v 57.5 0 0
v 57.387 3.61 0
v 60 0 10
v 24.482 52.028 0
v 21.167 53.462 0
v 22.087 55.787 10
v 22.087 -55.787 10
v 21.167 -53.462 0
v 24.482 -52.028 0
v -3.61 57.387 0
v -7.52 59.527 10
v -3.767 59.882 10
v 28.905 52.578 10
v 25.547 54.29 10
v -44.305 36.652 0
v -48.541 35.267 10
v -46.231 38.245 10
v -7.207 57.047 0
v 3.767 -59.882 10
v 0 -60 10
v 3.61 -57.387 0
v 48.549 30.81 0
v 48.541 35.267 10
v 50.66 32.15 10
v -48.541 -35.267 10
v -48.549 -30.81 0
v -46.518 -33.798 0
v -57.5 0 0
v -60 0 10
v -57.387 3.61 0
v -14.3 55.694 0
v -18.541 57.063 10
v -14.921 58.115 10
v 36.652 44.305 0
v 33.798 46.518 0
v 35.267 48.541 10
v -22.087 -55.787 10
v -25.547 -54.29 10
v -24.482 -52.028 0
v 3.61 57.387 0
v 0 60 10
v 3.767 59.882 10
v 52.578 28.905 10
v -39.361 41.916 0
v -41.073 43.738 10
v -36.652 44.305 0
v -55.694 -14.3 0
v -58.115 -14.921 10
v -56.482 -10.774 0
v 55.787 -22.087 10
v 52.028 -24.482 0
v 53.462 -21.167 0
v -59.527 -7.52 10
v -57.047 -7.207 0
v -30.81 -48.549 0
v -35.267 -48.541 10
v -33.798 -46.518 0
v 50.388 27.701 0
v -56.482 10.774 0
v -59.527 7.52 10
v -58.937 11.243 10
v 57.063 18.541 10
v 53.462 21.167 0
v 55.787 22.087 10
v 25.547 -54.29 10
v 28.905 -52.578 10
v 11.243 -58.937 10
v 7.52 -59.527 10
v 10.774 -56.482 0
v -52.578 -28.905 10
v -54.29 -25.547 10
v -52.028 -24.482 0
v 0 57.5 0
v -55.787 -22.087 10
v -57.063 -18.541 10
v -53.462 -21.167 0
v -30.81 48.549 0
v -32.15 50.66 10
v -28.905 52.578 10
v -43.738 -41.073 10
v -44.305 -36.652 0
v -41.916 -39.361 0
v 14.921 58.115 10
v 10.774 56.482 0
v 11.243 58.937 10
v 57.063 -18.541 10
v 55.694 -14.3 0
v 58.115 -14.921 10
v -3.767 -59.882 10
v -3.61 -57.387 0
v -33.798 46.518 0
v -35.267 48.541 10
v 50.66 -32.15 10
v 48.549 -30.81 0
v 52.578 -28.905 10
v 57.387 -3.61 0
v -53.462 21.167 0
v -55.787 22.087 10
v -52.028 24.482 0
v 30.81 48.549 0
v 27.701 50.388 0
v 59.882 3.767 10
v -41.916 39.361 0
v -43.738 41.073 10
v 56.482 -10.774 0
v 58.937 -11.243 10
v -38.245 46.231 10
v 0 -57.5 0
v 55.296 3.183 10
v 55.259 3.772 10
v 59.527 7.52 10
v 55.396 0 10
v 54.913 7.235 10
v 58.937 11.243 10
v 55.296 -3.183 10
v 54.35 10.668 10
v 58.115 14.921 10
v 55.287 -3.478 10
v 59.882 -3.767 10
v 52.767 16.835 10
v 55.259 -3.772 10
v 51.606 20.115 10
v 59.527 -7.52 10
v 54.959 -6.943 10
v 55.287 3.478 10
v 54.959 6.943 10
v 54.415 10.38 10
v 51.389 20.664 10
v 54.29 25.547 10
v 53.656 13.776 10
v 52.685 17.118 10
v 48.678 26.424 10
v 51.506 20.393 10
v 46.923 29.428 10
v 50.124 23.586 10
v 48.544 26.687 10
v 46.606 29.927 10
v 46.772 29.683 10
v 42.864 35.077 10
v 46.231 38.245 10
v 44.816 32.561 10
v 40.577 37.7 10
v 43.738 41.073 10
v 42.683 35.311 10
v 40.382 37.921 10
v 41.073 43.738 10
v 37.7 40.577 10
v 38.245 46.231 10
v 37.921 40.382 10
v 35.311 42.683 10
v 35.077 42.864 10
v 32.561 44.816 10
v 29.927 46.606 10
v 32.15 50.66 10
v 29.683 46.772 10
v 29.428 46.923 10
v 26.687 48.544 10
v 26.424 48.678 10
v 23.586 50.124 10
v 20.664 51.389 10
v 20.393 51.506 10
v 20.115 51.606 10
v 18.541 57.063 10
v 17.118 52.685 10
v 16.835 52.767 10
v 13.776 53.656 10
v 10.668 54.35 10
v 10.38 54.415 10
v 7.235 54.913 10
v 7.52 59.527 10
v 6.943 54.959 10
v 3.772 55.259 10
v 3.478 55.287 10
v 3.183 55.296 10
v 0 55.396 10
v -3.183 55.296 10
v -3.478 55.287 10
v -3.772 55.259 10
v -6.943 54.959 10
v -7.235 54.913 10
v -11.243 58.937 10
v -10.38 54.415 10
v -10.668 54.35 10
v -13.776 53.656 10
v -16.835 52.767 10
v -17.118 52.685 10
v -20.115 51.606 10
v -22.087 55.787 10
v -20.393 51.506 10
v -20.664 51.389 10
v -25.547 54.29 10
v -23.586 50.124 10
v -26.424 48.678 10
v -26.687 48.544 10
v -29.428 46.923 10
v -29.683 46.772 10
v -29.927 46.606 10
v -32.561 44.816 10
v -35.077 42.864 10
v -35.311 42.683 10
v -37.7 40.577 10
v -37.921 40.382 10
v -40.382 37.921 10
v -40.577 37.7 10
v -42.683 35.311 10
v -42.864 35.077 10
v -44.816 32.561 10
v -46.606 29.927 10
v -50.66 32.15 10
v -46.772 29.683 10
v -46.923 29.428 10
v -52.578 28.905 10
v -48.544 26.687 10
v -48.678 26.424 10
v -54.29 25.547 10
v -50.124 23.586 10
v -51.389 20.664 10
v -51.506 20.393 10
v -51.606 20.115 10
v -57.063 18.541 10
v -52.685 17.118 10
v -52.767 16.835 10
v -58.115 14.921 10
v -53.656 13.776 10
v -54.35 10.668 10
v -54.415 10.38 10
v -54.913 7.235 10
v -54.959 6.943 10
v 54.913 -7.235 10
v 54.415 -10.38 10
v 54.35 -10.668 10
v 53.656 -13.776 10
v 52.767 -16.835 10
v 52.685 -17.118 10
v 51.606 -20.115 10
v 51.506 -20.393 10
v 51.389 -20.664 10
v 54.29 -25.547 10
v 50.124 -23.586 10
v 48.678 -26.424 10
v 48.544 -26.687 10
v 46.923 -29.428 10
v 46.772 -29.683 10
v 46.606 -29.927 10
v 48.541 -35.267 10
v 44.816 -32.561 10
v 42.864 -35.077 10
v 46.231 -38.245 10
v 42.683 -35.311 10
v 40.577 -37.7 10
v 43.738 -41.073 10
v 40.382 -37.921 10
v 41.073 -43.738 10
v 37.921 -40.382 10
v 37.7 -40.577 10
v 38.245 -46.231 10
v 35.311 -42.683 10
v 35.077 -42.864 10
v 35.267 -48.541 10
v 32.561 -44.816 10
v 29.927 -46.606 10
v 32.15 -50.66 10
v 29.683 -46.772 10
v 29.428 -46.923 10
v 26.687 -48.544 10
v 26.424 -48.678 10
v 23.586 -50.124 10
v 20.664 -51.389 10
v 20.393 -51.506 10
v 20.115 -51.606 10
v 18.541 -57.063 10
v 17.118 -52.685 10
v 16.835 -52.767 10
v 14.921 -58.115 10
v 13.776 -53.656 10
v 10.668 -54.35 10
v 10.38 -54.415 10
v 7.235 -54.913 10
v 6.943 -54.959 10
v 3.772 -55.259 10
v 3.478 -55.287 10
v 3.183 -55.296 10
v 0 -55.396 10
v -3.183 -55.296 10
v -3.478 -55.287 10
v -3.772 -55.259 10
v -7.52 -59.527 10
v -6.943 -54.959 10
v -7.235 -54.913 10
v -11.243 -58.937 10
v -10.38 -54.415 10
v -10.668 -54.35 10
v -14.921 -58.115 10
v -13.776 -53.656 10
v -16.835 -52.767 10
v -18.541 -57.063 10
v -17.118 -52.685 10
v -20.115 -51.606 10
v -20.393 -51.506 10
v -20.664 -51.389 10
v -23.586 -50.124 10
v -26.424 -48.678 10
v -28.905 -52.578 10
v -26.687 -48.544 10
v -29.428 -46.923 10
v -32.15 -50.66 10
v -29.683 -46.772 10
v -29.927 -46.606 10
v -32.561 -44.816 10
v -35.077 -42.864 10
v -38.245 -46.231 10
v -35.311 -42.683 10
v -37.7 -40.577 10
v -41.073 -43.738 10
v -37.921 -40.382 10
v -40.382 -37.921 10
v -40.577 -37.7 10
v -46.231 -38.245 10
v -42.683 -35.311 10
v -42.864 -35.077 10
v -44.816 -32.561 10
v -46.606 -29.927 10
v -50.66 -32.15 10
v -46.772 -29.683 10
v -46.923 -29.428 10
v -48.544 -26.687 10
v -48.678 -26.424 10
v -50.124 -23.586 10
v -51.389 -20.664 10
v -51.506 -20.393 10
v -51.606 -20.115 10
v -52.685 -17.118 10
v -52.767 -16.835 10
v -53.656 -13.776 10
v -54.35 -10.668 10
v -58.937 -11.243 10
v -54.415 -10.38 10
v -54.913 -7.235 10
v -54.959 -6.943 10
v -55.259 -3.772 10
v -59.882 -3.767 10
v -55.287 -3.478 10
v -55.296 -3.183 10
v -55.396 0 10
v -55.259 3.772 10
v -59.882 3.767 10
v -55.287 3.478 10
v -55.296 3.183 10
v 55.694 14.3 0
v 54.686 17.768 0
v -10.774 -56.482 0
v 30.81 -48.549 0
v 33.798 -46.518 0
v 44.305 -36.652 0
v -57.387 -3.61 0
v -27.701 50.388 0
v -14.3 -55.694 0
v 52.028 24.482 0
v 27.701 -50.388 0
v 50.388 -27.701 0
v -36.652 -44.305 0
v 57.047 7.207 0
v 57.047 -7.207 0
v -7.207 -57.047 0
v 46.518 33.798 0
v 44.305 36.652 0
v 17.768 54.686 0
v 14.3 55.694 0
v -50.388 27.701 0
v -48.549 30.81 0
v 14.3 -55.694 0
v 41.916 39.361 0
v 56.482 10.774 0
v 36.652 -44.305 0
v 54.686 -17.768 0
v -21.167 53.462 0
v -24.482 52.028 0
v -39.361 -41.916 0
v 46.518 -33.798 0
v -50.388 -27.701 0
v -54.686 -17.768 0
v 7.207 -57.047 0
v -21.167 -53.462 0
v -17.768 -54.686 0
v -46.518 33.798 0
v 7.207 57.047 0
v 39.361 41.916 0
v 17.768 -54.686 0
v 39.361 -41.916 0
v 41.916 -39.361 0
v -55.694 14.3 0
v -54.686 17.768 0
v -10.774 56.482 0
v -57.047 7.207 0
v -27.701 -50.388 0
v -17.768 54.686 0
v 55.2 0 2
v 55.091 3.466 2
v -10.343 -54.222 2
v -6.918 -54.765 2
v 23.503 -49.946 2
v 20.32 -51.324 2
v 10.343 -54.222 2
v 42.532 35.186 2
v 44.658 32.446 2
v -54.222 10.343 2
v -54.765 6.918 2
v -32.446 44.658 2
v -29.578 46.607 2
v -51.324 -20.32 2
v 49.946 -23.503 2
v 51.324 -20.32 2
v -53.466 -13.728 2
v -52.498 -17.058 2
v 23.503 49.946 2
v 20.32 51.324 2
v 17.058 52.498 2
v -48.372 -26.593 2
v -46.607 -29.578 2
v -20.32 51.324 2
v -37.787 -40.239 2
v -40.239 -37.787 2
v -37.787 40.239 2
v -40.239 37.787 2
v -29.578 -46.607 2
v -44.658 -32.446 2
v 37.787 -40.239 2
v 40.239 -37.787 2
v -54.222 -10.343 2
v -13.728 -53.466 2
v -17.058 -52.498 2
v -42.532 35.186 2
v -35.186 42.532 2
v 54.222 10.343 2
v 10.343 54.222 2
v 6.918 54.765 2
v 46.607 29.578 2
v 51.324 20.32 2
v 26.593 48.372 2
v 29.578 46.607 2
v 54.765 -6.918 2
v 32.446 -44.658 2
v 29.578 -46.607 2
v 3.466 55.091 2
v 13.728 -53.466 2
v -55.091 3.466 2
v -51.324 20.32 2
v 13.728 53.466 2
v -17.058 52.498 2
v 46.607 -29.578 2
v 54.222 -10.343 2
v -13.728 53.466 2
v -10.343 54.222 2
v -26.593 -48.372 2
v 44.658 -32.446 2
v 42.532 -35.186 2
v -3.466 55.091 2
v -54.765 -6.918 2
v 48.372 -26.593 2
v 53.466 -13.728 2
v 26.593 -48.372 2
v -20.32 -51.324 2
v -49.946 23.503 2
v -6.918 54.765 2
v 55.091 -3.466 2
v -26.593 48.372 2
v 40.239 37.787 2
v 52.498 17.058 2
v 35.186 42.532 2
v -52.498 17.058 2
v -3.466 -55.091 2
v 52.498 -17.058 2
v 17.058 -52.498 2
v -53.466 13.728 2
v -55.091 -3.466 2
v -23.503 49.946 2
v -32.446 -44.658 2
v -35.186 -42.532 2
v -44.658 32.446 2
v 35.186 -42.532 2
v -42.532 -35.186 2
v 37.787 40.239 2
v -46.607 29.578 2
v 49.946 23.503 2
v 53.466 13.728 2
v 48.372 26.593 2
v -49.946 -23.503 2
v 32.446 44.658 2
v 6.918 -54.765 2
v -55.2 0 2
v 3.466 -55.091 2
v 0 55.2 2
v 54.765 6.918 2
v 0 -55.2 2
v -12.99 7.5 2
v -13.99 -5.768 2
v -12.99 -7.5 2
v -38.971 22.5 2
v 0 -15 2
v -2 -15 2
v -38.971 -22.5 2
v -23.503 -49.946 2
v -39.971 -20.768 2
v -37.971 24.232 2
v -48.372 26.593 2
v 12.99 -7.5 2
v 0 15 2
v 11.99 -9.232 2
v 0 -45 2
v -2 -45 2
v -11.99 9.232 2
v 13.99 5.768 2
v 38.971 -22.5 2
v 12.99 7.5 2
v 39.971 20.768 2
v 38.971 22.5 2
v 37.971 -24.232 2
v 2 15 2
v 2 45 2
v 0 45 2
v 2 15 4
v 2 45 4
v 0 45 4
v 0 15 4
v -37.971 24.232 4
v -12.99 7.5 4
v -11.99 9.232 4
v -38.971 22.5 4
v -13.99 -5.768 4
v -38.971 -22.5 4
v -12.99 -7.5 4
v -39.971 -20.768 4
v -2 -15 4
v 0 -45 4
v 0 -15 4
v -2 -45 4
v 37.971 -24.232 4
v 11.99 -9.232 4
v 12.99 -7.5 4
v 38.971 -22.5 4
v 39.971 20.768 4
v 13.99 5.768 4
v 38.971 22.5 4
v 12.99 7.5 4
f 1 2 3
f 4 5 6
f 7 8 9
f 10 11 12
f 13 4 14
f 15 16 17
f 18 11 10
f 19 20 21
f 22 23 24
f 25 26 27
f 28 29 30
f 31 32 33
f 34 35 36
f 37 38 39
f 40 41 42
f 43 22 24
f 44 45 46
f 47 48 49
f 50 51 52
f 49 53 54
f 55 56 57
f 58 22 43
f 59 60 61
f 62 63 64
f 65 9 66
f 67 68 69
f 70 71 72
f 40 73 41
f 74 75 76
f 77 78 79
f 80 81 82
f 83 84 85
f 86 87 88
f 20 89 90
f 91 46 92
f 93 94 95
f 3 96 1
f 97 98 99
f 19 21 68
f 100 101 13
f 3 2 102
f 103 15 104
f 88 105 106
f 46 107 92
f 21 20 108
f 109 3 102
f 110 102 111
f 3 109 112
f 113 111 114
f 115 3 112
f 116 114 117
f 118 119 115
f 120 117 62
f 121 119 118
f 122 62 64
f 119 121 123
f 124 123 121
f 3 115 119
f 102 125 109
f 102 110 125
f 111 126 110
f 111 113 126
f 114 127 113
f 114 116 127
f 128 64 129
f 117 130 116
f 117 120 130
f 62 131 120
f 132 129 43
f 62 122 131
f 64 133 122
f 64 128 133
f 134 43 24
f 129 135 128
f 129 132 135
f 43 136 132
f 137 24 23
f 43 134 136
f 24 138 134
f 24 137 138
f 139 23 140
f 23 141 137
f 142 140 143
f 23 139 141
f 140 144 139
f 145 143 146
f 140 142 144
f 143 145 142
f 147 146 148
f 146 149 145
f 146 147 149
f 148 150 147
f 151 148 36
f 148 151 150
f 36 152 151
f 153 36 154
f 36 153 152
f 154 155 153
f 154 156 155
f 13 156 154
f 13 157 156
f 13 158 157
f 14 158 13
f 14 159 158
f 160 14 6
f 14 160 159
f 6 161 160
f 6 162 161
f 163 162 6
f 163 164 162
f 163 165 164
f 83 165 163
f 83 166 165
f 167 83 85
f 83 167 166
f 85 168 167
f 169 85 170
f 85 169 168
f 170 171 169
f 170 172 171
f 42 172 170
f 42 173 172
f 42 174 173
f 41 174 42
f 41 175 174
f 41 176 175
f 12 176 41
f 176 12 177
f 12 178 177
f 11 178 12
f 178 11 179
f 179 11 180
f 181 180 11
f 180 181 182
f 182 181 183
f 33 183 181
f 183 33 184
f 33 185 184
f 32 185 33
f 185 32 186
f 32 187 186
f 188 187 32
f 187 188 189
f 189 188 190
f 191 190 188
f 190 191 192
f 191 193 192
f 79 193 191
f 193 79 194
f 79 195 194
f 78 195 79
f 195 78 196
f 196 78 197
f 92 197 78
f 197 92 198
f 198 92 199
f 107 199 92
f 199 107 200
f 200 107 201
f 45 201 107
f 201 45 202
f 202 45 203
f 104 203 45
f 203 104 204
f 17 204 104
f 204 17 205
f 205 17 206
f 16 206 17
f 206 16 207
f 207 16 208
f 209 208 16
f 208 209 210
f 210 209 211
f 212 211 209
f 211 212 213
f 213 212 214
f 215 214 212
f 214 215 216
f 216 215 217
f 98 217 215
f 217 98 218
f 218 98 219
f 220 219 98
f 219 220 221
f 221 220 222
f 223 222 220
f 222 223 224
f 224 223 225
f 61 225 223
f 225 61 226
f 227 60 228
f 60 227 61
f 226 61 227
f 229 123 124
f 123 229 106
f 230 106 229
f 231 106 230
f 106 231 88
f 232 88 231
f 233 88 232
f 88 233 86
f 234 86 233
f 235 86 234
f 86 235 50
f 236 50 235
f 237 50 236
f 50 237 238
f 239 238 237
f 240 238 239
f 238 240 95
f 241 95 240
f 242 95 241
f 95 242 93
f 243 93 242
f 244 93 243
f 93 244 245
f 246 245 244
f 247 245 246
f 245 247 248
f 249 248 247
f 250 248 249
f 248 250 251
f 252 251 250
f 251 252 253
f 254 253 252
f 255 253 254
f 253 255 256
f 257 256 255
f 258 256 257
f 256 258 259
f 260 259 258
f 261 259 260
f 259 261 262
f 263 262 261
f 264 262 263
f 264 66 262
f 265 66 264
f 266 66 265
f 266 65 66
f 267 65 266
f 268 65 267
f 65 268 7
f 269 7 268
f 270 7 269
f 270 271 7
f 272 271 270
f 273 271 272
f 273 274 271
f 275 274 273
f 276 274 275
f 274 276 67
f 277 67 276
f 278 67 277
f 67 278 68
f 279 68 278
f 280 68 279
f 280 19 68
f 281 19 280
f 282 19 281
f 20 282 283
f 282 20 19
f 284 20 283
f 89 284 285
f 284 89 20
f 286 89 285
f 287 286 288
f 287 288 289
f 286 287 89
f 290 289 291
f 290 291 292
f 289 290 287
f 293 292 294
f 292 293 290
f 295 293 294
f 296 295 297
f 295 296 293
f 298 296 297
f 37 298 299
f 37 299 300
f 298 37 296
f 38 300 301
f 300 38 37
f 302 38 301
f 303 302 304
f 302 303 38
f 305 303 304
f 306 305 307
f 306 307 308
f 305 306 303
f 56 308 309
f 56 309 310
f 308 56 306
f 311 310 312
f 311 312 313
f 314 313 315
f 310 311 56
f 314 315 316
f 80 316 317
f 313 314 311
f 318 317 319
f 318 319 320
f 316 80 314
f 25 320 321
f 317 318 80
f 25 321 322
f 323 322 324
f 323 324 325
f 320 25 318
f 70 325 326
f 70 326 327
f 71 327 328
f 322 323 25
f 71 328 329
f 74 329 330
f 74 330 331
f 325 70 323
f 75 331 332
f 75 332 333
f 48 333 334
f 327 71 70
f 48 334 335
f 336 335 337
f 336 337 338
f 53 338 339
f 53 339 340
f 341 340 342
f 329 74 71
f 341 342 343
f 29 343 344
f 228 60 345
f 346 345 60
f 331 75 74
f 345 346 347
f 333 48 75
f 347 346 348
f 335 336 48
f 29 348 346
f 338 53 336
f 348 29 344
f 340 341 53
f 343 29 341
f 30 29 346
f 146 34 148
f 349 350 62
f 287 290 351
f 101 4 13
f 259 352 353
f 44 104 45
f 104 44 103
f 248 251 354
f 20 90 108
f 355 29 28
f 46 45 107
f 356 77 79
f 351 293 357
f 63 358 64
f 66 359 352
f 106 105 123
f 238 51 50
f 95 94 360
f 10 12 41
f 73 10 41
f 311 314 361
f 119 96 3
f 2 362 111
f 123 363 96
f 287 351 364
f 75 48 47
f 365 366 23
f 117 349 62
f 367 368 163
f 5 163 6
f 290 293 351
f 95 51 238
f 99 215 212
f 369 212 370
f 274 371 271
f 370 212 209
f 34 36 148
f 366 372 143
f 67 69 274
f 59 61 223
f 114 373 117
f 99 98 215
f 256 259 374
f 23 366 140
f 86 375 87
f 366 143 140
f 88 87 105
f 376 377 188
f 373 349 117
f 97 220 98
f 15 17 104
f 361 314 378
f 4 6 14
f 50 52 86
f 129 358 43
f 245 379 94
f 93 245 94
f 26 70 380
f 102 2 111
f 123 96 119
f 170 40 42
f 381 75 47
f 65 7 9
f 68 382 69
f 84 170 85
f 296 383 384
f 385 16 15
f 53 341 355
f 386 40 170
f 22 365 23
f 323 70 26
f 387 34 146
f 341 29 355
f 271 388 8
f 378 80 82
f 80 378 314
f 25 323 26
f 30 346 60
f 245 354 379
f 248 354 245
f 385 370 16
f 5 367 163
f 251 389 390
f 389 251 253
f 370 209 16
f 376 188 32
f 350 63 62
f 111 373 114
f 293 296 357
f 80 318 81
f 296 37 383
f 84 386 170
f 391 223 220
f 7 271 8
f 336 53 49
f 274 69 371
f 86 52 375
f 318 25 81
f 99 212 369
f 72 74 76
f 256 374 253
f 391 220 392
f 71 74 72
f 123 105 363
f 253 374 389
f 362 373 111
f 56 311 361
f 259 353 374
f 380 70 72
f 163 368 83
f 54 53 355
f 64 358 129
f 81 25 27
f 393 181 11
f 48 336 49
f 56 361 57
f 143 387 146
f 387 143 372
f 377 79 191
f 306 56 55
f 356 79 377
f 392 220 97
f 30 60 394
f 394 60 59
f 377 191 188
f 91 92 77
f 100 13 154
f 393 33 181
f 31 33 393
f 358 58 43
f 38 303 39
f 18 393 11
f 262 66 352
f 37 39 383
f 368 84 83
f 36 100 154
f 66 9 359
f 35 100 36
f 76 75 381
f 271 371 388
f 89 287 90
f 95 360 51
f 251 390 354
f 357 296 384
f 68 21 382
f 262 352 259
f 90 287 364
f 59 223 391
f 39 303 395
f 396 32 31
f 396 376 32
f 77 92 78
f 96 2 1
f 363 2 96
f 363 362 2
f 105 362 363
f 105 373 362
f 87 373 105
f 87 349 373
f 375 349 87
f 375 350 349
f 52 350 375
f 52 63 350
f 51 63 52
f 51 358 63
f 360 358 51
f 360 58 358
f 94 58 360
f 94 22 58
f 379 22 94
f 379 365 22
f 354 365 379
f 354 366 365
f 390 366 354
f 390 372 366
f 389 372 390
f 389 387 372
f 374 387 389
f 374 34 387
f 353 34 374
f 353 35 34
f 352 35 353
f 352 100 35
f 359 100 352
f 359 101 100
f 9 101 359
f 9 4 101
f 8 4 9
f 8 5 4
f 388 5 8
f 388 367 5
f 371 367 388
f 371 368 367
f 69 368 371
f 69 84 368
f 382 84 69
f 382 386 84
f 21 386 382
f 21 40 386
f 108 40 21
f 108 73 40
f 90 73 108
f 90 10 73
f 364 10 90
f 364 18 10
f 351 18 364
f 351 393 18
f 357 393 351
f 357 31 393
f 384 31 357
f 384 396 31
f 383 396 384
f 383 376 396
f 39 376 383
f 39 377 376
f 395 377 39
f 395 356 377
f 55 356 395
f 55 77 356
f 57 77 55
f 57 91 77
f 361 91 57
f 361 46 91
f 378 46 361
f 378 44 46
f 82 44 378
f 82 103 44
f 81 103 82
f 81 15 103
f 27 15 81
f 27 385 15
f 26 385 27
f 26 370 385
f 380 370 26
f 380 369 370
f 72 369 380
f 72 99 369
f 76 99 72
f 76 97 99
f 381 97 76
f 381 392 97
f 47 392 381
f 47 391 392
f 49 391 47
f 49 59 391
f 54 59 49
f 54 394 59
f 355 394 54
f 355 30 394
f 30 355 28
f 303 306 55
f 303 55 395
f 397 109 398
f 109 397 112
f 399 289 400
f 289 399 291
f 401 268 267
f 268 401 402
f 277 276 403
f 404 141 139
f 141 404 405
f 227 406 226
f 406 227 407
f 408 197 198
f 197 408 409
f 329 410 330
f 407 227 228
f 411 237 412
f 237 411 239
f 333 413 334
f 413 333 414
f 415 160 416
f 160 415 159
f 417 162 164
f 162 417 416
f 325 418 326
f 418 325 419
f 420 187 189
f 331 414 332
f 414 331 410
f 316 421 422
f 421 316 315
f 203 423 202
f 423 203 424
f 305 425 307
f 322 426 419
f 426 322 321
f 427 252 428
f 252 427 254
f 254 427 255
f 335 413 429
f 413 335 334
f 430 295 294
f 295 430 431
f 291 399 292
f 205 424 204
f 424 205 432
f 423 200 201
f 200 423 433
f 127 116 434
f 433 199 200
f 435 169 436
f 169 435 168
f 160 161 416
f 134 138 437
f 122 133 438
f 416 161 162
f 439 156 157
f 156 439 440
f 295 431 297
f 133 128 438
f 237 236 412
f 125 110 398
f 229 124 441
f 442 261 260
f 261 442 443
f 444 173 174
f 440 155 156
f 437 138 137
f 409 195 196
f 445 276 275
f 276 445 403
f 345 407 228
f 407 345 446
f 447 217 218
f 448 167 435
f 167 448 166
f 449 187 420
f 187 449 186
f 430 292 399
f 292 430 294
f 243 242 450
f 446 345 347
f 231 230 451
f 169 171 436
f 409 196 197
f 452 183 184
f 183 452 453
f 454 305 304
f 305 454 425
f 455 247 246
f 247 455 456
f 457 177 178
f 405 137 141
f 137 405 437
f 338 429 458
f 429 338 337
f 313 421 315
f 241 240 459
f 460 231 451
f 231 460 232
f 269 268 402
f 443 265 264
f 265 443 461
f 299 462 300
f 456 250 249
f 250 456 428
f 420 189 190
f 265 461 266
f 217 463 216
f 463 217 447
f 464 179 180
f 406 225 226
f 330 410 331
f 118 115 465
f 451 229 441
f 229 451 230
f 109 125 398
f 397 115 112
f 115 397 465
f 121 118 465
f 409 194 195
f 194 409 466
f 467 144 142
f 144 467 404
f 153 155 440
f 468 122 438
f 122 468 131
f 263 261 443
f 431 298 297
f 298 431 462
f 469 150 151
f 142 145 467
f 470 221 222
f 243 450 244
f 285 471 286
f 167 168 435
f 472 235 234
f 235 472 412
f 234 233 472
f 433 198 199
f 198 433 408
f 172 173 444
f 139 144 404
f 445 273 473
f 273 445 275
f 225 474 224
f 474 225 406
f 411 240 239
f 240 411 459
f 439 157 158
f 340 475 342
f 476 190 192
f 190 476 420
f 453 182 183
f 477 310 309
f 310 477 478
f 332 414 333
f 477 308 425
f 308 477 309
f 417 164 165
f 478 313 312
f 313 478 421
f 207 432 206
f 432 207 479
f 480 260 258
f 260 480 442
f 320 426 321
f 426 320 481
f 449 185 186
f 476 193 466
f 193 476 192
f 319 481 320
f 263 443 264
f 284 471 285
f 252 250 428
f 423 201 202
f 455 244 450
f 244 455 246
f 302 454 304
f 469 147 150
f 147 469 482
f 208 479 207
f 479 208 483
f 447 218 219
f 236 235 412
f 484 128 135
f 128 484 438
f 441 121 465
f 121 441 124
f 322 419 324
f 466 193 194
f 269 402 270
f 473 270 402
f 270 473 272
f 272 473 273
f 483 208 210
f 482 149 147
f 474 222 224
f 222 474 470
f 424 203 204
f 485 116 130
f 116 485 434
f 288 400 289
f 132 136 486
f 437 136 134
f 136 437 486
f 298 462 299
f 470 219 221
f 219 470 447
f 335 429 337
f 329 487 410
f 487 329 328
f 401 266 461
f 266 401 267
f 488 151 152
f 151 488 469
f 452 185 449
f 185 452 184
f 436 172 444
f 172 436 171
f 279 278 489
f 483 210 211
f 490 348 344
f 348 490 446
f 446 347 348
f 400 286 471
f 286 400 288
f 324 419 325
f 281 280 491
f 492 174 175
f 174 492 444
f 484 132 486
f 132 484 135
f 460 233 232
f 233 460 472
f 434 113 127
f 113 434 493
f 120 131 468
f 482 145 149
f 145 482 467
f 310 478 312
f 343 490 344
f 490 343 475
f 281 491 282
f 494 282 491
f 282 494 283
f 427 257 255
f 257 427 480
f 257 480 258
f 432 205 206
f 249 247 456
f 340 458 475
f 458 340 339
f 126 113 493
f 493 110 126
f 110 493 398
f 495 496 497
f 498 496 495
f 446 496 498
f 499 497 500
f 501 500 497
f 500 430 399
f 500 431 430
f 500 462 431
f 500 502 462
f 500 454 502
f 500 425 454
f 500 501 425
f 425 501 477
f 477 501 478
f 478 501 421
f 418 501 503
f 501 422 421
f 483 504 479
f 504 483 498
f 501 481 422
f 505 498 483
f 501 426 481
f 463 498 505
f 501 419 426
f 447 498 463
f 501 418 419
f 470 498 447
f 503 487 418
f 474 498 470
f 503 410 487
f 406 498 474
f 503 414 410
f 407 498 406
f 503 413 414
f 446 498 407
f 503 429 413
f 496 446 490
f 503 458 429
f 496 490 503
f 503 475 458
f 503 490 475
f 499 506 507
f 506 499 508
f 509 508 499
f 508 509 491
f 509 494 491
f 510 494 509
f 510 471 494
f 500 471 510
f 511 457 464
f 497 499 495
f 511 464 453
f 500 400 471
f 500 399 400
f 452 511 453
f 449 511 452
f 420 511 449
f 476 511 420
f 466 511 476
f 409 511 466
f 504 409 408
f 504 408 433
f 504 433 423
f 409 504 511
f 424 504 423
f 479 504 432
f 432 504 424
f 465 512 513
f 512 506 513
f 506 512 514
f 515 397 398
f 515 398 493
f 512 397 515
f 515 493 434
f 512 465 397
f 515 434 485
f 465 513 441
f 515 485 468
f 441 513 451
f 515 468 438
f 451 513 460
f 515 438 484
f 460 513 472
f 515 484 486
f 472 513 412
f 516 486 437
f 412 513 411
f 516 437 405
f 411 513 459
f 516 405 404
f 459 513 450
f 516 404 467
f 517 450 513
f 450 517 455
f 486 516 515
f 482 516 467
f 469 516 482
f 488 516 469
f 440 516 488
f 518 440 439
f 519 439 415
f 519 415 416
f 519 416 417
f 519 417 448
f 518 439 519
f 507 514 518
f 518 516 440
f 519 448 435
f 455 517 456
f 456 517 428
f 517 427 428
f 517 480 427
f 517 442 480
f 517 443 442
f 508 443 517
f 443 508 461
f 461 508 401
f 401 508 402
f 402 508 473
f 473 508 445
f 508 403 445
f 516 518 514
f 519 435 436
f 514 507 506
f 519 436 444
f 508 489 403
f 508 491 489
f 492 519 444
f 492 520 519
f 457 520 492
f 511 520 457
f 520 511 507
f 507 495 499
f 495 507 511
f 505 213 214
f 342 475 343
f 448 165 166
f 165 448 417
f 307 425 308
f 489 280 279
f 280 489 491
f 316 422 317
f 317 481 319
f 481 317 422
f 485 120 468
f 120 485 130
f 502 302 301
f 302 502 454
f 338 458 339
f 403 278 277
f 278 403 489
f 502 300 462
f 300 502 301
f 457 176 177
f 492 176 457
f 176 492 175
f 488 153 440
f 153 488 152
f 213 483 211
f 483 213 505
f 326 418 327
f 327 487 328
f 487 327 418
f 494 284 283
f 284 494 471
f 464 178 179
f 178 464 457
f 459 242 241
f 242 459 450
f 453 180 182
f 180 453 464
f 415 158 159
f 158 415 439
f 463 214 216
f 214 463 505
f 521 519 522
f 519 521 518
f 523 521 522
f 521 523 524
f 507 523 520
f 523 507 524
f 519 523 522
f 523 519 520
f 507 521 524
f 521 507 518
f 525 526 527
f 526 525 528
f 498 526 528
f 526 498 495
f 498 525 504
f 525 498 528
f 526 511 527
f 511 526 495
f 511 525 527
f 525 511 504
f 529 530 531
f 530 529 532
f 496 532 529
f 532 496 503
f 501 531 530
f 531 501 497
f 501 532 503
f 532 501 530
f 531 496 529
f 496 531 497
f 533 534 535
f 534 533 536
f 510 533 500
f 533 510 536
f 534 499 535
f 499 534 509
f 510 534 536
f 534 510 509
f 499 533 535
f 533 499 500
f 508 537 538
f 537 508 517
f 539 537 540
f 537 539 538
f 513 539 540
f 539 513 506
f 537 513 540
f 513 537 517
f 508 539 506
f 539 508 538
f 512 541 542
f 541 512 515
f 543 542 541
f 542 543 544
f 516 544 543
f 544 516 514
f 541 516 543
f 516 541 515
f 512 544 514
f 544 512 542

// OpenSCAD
// variables
size = 100; // [50:S,100:M,150:L]
wallthickness = 2; // [1:S,2:M,3:L]
resolution = 100; // [100:rough,150:middle,200:fine]

// model coaster
union(){
	difference(){
		translate([0,0,0])cylinder(h = size*.1, r1 = size*1.15/2, r2 = size*1.2/2, $fn = resolution);
		translate([0,0,wallthickness])cylinder(h = size-wallthickness, r1 = (size-2*wallthickness)*1.15/2, r2 = (size-2*wallthickness)*1.2/2, $fn = resolution);
	}
	union(){
		rotate([0,0,0]) translate([0,15,wallthickness]) cube([wallthickness,size*0.30,wallthickness]);
		rotate([0,0,60]) translate([0,15,wallthickness]) cube([wallthickness,size*0.30,wallthickness]);
		rotate([0,0,120]) translate([0,15,wallthickness]) cube([wallthickness,size*0.30,wallthickness]);
		rotate([0,0,180]) translate([0,15,wallthickness]) cube([wallthickness,size*0.30,wallthickness]);
		rotate([0,0,240]) translate([0,15,wallthickness]) cube([wallthickness,size*0.30,wallthickness]);
		rotate([0,0,300]) translate([0,15,wallthickness]) cube([wallthickness,size*0.30,wallthickness]);
	}
}
